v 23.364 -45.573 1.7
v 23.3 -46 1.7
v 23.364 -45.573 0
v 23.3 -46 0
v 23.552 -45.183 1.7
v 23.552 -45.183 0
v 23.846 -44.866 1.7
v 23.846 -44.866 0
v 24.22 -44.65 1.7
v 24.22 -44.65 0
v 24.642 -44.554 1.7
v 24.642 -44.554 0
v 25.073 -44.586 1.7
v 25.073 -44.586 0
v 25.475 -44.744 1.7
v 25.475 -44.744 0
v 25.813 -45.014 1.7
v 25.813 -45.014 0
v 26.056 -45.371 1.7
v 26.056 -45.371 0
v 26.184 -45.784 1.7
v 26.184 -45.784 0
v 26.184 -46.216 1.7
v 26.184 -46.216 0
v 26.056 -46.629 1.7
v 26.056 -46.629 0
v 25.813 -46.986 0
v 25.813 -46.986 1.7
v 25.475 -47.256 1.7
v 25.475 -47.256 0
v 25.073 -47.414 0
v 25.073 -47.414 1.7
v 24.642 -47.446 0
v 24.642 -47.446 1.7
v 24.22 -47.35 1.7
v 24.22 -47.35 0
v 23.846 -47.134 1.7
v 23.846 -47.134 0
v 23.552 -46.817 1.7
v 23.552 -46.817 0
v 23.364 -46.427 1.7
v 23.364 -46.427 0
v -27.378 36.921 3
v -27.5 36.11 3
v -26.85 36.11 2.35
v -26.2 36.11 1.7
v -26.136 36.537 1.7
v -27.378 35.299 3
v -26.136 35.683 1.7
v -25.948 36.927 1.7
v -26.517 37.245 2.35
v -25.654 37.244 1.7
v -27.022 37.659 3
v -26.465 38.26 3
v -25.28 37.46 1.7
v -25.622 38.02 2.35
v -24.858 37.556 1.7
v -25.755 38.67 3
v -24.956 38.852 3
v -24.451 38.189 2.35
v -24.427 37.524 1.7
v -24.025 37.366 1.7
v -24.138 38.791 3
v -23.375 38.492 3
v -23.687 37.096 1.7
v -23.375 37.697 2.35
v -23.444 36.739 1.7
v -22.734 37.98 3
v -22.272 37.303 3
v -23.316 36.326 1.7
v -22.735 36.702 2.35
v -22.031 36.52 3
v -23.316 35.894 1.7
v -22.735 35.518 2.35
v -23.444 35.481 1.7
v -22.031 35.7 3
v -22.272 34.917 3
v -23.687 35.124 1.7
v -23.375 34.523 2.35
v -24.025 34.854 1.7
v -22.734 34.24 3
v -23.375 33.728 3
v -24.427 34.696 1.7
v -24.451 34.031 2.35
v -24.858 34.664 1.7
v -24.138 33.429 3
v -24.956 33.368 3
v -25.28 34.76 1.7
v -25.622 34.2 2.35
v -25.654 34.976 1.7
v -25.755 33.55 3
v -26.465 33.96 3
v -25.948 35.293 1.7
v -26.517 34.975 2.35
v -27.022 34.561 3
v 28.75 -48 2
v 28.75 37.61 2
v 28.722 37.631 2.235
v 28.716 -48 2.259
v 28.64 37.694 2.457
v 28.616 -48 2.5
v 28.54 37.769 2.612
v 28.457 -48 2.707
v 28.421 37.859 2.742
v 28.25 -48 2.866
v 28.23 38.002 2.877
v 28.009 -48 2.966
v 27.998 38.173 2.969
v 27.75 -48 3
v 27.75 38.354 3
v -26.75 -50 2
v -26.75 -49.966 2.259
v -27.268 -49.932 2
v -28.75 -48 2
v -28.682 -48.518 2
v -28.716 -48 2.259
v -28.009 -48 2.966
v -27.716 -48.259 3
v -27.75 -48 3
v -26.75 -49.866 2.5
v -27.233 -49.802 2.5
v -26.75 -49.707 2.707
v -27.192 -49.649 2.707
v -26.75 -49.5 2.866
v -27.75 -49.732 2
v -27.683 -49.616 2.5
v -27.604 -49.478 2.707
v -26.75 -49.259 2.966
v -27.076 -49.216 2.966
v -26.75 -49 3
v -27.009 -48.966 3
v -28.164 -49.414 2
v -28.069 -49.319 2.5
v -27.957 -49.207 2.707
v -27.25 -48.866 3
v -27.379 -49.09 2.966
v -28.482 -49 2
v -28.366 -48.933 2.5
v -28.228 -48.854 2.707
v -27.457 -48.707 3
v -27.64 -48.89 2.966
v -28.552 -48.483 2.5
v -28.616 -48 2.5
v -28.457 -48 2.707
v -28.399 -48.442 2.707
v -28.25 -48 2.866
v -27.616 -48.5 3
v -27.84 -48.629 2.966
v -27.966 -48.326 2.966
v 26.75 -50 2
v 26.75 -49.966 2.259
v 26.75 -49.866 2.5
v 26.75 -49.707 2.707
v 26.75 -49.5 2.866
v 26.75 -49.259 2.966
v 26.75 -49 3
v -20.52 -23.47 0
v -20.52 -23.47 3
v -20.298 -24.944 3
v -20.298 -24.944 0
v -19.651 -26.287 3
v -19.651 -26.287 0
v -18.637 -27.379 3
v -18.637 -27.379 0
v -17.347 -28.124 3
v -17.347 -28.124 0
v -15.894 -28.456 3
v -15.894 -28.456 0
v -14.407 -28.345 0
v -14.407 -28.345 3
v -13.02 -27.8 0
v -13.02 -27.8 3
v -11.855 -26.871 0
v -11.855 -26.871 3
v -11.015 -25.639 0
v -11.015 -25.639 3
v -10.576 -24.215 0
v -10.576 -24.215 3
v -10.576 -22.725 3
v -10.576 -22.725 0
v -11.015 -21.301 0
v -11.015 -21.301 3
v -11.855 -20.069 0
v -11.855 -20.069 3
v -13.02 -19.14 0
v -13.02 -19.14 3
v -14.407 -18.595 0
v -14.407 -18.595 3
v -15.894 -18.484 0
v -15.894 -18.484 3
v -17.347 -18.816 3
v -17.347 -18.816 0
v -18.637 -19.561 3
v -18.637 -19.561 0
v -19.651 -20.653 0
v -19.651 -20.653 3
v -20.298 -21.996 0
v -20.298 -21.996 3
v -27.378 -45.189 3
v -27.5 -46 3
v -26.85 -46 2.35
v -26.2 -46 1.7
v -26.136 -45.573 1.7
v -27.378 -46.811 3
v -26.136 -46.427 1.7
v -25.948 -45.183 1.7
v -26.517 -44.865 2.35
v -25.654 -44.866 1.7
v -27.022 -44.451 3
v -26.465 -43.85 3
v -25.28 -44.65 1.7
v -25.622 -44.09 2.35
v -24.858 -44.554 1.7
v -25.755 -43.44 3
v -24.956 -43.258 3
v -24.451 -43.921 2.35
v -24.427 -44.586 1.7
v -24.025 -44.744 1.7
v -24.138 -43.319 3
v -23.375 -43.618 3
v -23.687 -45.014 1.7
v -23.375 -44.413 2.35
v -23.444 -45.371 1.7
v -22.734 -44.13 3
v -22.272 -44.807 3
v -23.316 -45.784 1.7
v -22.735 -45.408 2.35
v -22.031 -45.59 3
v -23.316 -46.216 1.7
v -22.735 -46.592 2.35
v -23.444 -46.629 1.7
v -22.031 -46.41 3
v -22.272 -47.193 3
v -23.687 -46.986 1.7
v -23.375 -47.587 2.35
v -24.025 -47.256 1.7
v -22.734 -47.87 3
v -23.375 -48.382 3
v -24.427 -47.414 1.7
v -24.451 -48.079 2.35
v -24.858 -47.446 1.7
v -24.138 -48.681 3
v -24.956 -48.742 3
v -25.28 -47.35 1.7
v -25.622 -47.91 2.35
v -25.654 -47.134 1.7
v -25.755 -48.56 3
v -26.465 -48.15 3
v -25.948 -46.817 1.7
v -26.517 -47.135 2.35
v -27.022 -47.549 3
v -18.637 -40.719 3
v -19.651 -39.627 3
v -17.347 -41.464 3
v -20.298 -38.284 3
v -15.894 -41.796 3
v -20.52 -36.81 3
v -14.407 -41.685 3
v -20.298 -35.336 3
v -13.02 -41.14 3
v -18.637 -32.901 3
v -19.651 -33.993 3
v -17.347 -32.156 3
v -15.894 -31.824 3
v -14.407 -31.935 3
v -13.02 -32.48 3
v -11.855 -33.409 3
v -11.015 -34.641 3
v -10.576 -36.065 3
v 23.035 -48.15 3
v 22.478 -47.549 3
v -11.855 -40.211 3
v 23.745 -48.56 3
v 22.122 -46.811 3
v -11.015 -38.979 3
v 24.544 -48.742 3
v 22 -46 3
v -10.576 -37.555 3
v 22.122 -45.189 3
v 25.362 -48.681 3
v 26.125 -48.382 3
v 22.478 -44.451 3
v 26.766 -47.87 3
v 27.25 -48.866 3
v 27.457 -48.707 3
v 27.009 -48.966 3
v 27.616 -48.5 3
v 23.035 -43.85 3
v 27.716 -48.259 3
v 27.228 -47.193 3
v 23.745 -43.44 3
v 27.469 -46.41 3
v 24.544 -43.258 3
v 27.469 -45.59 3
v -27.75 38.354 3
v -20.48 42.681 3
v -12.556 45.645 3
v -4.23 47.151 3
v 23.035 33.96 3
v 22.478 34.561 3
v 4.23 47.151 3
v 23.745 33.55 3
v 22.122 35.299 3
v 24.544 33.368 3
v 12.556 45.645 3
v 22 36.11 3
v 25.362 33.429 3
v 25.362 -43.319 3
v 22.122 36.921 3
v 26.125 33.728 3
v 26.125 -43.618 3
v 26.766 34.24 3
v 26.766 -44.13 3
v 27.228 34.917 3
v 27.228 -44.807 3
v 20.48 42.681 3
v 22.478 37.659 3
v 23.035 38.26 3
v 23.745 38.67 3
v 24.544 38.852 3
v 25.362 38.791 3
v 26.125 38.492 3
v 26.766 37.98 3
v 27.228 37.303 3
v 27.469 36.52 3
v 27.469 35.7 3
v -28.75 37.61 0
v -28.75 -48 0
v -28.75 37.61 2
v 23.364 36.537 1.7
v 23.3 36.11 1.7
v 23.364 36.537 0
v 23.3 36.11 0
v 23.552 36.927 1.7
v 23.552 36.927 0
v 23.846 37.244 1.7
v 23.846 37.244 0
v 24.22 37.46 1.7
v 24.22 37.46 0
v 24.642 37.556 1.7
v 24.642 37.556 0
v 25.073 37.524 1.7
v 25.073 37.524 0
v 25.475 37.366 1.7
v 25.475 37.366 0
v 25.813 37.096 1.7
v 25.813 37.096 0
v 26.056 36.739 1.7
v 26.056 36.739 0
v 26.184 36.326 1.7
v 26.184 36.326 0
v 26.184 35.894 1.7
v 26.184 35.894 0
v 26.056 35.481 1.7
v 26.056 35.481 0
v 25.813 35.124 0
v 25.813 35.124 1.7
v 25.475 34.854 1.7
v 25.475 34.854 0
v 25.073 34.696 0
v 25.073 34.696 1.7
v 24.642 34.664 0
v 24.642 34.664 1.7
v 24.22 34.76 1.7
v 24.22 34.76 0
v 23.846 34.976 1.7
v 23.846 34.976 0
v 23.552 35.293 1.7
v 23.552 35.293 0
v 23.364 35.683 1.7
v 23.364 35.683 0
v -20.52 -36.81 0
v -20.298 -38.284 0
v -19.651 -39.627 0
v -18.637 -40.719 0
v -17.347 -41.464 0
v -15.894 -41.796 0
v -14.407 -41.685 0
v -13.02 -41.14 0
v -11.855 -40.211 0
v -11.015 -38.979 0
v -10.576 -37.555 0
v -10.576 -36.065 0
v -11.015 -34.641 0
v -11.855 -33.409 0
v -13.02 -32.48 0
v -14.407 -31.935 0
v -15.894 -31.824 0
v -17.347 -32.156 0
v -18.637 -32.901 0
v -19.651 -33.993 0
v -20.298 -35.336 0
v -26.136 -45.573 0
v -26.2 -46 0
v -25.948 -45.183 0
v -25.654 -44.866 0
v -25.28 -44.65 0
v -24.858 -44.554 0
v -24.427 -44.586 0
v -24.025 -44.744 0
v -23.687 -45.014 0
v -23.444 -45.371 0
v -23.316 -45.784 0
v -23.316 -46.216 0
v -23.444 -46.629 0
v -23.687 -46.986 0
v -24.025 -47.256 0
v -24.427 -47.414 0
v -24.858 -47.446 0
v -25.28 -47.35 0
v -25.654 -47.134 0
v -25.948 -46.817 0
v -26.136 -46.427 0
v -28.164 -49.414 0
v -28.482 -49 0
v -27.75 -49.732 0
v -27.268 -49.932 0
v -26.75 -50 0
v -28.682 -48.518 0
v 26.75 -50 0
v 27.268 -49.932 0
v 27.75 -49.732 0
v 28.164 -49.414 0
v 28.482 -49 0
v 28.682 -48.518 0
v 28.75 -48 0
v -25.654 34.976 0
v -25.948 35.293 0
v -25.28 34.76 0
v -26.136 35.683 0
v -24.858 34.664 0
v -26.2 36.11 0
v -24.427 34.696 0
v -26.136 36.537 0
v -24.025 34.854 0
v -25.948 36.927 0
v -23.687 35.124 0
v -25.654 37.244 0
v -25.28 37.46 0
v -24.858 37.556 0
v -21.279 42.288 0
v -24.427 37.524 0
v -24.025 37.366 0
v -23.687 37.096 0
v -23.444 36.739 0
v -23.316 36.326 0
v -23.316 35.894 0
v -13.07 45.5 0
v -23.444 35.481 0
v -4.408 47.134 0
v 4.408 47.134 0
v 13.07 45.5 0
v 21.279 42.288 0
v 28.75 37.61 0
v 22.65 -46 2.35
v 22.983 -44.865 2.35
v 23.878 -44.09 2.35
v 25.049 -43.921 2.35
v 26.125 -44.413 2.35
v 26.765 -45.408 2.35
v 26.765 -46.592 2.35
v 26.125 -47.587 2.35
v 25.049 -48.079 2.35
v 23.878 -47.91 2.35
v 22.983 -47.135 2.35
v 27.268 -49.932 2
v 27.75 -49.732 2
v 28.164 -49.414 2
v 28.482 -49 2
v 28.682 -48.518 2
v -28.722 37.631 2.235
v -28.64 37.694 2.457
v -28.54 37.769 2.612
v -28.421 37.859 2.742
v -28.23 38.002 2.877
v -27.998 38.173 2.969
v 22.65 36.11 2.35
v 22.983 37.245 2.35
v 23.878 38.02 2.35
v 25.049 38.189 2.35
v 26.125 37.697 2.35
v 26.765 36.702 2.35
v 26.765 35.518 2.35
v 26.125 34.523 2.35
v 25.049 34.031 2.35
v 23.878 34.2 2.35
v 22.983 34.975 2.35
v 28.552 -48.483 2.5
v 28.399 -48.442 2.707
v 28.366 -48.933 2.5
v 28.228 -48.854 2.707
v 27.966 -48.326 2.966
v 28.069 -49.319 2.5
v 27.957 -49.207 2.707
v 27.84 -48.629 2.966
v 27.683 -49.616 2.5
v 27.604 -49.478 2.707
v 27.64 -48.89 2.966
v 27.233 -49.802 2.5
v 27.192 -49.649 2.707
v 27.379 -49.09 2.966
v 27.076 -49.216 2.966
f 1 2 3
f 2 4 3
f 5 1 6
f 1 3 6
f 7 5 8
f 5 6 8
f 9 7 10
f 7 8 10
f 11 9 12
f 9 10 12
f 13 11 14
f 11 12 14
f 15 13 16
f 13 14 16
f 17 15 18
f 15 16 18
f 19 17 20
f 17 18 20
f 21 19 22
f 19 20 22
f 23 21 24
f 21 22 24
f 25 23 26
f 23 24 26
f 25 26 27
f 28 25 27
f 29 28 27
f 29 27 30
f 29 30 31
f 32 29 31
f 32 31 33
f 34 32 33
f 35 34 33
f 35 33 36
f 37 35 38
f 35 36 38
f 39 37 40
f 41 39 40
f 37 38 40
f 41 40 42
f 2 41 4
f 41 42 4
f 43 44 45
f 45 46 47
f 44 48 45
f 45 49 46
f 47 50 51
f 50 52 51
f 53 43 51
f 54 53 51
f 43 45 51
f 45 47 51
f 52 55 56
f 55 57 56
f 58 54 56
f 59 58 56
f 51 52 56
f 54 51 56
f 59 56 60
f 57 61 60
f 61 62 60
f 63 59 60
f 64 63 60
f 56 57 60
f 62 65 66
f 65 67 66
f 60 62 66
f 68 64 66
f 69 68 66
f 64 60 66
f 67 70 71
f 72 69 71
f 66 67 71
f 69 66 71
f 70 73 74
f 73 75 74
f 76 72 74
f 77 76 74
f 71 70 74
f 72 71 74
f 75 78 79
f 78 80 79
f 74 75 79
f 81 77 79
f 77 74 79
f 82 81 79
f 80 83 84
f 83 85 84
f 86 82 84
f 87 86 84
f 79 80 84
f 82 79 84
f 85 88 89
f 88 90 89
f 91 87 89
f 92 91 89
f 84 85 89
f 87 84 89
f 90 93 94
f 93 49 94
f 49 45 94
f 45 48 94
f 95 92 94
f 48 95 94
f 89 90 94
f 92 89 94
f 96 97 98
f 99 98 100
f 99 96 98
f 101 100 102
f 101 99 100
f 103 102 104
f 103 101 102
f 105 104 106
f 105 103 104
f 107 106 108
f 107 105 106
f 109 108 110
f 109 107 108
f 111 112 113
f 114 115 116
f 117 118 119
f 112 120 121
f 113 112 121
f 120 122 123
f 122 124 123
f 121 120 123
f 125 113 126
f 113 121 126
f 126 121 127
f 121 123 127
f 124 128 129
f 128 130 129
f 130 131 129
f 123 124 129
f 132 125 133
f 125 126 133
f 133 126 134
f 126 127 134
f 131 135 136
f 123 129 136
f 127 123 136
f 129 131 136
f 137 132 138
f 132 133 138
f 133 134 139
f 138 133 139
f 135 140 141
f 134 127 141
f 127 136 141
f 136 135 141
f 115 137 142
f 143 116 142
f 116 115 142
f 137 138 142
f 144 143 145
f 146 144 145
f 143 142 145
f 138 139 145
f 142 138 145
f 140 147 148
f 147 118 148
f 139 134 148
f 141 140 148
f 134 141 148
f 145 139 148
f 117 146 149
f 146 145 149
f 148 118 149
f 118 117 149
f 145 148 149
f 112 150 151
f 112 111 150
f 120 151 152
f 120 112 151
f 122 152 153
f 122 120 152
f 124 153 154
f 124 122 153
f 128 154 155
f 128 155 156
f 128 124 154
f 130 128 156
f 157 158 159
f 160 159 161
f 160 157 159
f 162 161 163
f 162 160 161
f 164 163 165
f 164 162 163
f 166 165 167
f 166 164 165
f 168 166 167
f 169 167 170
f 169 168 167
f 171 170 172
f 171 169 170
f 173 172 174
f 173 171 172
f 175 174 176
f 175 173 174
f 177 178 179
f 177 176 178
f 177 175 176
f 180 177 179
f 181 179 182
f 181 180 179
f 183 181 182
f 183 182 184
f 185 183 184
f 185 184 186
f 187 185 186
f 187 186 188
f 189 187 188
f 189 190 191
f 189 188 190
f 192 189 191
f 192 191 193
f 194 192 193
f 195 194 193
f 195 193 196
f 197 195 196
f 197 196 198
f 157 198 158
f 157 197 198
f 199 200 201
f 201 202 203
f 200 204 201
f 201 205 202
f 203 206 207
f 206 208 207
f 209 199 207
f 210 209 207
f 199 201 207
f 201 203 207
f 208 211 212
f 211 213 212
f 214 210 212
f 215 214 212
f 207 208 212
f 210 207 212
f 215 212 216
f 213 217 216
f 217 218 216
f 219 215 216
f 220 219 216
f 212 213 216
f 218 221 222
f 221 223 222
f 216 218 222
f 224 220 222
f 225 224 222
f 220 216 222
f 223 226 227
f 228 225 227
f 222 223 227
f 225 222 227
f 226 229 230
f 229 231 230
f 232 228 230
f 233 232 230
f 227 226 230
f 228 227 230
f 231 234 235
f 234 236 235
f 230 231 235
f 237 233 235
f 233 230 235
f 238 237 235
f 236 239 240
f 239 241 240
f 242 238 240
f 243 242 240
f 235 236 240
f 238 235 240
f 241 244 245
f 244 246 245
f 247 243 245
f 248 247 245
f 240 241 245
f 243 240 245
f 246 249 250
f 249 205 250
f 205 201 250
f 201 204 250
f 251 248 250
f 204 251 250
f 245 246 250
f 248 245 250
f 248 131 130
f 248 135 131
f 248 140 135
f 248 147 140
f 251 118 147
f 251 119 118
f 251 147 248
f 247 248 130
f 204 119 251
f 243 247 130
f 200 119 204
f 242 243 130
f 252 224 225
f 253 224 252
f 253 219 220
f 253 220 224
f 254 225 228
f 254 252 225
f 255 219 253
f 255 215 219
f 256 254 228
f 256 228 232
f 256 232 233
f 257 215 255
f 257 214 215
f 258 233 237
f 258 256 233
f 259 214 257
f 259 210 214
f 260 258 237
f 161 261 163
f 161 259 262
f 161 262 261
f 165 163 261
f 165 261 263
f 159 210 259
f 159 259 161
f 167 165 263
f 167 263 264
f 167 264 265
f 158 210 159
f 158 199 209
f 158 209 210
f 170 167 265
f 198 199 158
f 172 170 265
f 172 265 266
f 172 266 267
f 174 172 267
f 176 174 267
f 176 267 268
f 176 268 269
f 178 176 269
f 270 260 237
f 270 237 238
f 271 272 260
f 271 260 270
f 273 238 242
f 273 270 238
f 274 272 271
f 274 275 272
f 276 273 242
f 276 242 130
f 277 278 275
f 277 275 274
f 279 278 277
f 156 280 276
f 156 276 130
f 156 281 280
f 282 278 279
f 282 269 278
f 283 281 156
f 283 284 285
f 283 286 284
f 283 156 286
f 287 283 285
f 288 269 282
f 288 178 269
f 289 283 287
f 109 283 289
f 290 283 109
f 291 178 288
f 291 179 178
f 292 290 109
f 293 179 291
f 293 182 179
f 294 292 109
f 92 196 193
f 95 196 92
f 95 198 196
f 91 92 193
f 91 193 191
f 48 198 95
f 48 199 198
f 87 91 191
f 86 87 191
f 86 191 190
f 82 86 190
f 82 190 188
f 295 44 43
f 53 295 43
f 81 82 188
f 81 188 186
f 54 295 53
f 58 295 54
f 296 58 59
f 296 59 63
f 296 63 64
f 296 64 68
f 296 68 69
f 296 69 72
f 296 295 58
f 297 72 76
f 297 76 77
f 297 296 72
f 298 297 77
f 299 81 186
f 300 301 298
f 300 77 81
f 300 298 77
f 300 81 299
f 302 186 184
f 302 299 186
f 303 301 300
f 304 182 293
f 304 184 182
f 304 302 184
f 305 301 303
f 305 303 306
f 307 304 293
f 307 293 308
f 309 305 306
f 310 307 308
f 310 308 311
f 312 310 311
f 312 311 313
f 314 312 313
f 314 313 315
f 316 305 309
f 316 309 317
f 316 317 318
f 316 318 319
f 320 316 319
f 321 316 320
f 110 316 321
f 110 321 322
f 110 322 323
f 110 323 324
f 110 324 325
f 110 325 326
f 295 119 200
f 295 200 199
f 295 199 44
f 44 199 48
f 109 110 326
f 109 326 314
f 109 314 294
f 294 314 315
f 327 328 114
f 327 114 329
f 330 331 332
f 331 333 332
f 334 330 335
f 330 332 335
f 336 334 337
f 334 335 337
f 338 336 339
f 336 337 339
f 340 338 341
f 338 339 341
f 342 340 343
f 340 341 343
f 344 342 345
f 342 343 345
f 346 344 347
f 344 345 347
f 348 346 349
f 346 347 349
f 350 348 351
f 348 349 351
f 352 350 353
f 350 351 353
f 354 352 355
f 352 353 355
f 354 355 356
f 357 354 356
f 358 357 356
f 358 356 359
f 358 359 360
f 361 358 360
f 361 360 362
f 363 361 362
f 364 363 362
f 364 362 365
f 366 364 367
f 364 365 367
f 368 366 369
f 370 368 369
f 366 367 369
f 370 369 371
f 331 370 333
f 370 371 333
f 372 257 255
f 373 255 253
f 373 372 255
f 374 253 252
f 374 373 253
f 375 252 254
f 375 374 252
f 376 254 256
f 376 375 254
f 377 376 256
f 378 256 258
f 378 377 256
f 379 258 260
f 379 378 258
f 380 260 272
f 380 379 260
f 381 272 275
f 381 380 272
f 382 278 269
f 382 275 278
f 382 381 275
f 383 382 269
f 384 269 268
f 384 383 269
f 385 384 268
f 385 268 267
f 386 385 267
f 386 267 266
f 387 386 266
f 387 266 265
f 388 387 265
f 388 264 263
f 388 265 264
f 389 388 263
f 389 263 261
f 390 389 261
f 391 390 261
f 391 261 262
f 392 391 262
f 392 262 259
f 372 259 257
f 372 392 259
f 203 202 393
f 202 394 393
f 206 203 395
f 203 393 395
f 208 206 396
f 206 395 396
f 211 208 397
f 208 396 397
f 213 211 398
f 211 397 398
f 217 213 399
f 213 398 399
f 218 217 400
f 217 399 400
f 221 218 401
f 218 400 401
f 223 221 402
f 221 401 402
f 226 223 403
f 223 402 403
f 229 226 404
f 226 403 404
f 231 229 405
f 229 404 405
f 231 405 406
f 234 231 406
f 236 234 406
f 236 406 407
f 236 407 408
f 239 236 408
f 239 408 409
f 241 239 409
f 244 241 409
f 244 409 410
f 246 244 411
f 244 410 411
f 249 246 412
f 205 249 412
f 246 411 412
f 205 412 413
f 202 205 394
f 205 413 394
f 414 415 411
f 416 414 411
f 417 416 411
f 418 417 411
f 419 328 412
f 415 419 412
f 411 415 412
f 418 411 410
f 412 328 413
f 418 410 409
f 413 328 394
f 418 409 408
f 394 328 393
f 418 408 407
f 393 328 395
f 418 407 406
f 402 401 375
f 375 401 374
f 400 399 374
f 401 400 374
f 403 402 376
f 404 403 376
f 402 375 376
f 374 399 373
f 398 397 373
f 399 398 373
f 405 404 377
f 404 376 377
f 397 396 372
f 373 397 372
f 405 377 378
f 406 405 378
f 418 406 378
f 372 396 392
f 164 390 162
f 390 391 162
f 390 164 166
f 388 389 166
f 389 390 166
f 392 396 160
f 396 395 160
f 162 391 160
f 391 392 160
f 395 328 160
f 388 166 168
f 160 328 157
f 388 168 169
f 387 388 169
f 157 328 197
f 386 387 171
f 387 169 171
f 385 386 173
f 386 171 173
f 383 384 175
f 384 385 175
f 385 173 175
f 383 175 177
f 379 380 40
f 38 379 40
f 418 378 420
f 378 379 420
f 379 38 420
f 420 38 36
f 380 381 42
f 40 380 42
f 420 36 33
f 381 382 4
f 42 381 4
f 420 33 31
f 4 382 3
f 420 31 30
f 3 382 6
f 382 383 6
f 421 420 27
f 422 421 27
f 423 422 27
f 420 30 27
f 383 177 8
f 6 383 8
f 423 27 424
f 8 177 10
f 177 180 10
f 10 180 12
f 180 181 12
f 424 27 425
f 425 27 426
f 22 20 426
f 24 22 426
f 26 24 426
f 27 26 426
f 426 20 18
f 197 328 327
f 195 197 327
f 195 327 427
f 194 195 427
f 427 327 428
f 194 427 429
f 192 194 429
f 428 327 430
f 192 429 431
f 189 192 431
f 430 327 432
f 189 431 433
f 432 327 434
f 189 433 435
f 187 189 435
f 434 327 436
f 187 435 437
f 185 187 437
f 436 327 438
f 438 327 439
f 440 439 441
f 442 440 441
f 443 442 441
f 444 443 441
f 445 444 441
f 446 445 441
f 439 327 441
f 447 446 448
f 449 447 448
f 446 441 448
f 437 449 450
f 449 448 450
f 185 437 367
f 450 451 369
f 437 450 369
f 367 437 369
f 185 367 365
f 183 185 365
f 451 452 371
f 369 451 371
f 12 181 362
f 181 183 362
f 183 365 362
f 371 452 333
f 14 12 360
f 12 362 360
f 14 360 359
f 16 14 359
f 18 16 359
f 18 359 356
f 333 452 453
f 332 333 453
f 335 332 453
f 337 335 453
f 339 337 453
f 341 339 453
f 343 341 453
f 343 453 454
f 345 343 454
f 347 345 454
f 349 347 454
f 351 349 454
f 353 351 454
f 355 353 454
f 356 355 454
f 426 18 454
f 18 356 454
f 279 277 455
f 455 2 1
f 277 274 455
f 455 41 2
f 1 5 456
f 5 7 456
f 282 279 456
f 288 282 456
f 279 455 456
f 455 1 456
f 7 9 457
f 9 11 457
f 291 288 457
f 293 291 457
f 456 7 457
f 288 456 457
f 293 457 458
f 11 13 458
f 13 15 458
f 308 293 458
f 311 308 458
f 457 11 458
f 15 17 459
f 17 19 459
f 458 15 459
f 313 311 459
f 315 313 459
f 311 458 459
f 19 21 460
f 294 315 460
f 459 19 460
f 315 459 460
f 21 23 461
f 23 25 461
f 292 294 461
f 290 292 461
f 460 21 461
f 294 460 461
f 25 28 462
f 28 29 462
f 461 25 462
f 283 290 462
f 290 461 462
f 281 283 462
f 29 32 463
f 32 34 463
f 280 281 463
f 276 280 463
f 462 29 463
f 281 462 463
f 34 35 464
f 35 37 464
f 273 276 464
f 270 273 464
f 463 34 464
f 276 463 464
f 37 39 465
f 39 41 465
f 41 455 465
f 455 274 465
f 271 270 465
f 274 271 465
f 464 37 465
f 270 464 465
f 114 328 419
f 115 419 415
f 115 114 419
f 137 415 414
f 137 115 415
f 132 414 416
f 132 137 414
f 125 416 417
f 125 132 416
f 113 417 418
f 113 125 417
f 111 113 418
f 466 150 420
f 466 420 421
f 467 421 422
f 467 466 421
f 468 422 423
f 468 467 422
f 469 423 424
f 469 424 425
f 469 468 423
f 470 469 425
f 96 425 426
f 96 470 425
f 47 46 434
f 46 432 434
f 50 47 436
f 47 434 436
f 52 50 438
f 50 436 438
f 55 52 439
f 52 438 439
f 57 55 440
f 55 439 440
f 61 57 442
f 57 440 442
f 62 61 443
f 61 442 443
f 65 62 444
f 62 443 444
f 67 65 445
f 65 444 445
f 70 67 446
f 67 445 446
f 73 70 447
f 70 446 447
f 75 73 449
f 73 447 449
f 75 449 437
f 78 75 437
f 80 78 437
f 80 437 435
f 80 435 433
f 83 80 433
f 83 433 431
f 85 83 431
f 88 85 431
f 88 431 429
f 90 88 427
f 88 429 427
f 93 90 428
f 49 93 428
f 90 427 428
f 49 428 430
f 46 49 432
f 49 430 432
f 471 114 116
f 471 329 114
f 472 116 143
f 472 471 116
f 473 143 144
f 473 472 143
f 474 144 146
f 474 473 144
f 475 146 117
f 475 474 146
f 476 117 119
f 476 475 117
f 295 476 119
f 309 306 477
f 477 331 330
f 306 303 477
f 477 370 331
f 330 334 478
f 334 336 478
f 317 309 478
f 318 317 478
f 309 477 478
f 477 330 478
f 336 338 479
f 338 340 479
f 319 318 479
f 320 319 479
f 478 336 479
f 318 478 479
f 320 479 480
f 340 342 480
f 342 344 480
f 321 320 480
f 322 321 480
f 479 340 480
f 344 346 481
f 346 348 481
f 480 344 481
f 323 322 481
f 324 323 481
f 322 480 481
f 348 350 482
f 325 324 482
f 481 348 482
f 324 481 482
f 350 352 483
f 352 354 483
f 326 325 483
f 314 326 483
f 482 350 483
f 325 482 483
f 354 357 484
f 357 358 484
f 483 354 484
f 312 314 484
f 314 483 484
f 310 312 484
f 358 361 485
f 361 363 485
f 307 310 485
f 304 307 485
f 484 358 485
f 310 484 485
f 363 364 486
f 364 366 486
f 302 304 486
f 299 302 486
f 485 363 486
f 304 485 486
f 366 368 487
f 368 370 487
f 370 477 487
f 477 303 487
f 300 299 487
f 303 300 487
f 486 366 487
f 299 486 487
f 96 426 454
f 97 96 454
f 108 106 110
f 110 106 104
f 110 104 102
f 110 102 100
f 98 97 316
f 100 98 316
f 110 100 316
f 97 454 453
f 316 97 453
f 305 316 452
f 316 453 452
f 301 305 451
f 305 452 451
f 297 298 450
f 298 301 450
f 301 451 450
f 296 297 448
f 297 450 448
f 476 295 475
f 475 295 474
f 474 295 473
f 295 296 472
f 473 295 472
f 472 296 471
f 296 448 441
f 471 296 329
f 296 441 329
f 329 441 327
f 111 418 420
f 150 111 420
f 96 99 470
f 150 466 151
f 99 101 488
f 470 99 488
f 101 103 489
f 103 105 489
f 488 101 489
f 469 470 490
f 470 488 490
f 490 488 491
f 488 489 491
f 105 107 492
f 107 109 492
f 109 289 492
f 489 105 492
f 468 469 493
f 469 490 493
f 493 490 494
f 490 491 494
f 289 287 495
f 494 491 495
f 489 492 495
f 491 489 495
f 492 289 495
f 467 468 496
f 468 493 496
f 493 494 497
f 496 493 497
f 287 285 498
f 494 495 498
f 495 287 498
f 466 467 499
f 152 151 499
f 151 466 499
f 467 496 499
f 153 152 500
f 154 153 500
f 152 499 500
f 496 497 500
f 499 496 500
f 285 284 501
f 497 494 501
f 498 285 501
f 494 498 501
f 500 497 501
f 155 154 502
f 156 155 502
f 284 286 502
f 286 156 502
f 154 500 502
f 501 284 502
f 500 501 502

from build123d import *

# Parameters (mm, degrees)
SCHIZZO4_W                               = 57.5
SCHIZZO4_H                               = 100
ESTRUSIONE_ESTRUSIONE2_DEPTH             = 3
TAGLIO_ESTRUSIONE2_REACH                 = 59.754
SCHIZZO7_R                               = 5
RACCORDO1_R                              = 2
RACCORDO3_R                              = 2
RACCORDO4_R                              = 1
FORO_SVASATO_PER_VITE_M2_5_1_D           = 2.9
FORO_SVASATO_PER_VITE_M2_5_1_CSINK_D     = 5.5
FORO_SVASATO_PER_VITE_M2_5_1_CSINK_ANGLE = 90


with BuildPart() as part:
    # Schizzo4 → Estrusione-Estrusione2 (new body)
    with BuildSketch(Plane.XY):
        Rectangle(SCHIZZO4_W, SCHIZZO4_H)
    extrude(amount=ESTRUSIONE_ESTRUSIONE2_DEPTH)

    # Schizzo7 → Taglio-Estrusione2 (cut, up to next)
    with BuildSketch(Plane.XY, mode=Mode.PRIVATE) as taglio_estrusione2_sk1:
        with Locations(Location((-15.52, -36.81, 0), (0, 0, 180))):
            Circle(SCHIZZO7_R)
    taglio_estrusione2_tool1 = extrude(taglio_estrusione2_sk1.sketch, amount=TAGLIO_ESTRUSIONE2_REACH, mode=Mode.PRIVATE) & part.part
    # Schizzo7 → Taglio-Estrusione2 (cut, up to next)
    with BuildSketch(Plane.XY, mode=Mode.PRIVATE) as taglio_estrusione2_sk2:
        with Locations(Location((-15.52, -23.47, 0), (0, 0, 180))):
            Circle(SCHIZZO7_R)
    taglio_estrusione2_tool2 = extrude(taglio_estrusione2_sk2.sketch, amount=TAGLIO_ESTRUSIONE2_REACH, mode=Mode.PRIVATE) & part.part
    # Schizzo7 → Taglio-Estrusione2 (cut, up to next)
    with BuildSketch(Plane.XY, mode=Mode.PRIVATE) as taglio_estrusione2_sk3:
        with BuildLine():
            Line((-28.75, 37.61), (-28.75, 50))
            Line((-28.75, 50), (28.75, 50))
            Line((28.75, 50), (28.75, 37.61))
            ThreePointArc((28.75, 37.61), (0, 47.339989438), (-28.75, 37.61))
        make_face()
    taglio_estrusione2_tool3 = extrude(taglio_estrusione2_sk3.sketch, amount=TAGLIO_ESTRUSIONE2_REACH, mode=Mode.PRIVATE) & part.part
    add(taglio_estrusione2_tool1.solids().sort_by_distance((-15.52, -36.81, 0))[0], mode=Mode.SUBTRACT)
    add(taglio_estrusione2_tool2.solids().sort_by_distance((-15.52, -23.47, 0))[0], mode=Mode.SUBTRACT)
    add(taglio_estrusione2_tool3.solids().sort_by_distance((-28.161803, 43.805, 0))[0], mode=Mode.SUBTRACT)

    # Raccordo1
    raccordo1_edges = [part.edges().sort_by_distance(p)[0] for p in [
        (-28.75, -50, 1.5),
    ]]
    fillet(raccordo1_edges, radius=RACCORDO1_R)

    # Raccordo3
    raccordo3_edges = [part.edges().sort_by_distance(p)[0] for p in [
        (28.75, -50, 1.5),
    ]]
    fillet(raccordo3_edges, radius=RACCORDO3_R)

    # Raccordo4
    raccordo4_edges = [part.edges().sort_by_distance(p)[0] for p in [
        (-28.75, -5.195, 3),
        (0, -50, 3),
        (-28.164213562, -49.414213562, 3),
        (28.75, -5.195, 3),
        (28.164213562, -49.414213562, 3),
    ]]
    fillet(raccordo4_edges, radius=RACCORDO4_R)

    # Foro svasato per Vite M2.5-1 (through all)
    with Locations(Plane.XY.offset(3)):
        with Locations((-24.75, 36.11), (24.75, -46), (-24.75, -46), (24.75, 36.11)):
            CounterSinkHole(FORO_SVASATO_PER_VITE_M2_5_1_D / 2, FORO_SVASATO_PER_VITE_M2_5_1_CSINK_D / 2, counter_sink_angle=FORO_SVASATO_PER_VITE_M2_5_1_CSINK_ANGLE)


solid = part.part
